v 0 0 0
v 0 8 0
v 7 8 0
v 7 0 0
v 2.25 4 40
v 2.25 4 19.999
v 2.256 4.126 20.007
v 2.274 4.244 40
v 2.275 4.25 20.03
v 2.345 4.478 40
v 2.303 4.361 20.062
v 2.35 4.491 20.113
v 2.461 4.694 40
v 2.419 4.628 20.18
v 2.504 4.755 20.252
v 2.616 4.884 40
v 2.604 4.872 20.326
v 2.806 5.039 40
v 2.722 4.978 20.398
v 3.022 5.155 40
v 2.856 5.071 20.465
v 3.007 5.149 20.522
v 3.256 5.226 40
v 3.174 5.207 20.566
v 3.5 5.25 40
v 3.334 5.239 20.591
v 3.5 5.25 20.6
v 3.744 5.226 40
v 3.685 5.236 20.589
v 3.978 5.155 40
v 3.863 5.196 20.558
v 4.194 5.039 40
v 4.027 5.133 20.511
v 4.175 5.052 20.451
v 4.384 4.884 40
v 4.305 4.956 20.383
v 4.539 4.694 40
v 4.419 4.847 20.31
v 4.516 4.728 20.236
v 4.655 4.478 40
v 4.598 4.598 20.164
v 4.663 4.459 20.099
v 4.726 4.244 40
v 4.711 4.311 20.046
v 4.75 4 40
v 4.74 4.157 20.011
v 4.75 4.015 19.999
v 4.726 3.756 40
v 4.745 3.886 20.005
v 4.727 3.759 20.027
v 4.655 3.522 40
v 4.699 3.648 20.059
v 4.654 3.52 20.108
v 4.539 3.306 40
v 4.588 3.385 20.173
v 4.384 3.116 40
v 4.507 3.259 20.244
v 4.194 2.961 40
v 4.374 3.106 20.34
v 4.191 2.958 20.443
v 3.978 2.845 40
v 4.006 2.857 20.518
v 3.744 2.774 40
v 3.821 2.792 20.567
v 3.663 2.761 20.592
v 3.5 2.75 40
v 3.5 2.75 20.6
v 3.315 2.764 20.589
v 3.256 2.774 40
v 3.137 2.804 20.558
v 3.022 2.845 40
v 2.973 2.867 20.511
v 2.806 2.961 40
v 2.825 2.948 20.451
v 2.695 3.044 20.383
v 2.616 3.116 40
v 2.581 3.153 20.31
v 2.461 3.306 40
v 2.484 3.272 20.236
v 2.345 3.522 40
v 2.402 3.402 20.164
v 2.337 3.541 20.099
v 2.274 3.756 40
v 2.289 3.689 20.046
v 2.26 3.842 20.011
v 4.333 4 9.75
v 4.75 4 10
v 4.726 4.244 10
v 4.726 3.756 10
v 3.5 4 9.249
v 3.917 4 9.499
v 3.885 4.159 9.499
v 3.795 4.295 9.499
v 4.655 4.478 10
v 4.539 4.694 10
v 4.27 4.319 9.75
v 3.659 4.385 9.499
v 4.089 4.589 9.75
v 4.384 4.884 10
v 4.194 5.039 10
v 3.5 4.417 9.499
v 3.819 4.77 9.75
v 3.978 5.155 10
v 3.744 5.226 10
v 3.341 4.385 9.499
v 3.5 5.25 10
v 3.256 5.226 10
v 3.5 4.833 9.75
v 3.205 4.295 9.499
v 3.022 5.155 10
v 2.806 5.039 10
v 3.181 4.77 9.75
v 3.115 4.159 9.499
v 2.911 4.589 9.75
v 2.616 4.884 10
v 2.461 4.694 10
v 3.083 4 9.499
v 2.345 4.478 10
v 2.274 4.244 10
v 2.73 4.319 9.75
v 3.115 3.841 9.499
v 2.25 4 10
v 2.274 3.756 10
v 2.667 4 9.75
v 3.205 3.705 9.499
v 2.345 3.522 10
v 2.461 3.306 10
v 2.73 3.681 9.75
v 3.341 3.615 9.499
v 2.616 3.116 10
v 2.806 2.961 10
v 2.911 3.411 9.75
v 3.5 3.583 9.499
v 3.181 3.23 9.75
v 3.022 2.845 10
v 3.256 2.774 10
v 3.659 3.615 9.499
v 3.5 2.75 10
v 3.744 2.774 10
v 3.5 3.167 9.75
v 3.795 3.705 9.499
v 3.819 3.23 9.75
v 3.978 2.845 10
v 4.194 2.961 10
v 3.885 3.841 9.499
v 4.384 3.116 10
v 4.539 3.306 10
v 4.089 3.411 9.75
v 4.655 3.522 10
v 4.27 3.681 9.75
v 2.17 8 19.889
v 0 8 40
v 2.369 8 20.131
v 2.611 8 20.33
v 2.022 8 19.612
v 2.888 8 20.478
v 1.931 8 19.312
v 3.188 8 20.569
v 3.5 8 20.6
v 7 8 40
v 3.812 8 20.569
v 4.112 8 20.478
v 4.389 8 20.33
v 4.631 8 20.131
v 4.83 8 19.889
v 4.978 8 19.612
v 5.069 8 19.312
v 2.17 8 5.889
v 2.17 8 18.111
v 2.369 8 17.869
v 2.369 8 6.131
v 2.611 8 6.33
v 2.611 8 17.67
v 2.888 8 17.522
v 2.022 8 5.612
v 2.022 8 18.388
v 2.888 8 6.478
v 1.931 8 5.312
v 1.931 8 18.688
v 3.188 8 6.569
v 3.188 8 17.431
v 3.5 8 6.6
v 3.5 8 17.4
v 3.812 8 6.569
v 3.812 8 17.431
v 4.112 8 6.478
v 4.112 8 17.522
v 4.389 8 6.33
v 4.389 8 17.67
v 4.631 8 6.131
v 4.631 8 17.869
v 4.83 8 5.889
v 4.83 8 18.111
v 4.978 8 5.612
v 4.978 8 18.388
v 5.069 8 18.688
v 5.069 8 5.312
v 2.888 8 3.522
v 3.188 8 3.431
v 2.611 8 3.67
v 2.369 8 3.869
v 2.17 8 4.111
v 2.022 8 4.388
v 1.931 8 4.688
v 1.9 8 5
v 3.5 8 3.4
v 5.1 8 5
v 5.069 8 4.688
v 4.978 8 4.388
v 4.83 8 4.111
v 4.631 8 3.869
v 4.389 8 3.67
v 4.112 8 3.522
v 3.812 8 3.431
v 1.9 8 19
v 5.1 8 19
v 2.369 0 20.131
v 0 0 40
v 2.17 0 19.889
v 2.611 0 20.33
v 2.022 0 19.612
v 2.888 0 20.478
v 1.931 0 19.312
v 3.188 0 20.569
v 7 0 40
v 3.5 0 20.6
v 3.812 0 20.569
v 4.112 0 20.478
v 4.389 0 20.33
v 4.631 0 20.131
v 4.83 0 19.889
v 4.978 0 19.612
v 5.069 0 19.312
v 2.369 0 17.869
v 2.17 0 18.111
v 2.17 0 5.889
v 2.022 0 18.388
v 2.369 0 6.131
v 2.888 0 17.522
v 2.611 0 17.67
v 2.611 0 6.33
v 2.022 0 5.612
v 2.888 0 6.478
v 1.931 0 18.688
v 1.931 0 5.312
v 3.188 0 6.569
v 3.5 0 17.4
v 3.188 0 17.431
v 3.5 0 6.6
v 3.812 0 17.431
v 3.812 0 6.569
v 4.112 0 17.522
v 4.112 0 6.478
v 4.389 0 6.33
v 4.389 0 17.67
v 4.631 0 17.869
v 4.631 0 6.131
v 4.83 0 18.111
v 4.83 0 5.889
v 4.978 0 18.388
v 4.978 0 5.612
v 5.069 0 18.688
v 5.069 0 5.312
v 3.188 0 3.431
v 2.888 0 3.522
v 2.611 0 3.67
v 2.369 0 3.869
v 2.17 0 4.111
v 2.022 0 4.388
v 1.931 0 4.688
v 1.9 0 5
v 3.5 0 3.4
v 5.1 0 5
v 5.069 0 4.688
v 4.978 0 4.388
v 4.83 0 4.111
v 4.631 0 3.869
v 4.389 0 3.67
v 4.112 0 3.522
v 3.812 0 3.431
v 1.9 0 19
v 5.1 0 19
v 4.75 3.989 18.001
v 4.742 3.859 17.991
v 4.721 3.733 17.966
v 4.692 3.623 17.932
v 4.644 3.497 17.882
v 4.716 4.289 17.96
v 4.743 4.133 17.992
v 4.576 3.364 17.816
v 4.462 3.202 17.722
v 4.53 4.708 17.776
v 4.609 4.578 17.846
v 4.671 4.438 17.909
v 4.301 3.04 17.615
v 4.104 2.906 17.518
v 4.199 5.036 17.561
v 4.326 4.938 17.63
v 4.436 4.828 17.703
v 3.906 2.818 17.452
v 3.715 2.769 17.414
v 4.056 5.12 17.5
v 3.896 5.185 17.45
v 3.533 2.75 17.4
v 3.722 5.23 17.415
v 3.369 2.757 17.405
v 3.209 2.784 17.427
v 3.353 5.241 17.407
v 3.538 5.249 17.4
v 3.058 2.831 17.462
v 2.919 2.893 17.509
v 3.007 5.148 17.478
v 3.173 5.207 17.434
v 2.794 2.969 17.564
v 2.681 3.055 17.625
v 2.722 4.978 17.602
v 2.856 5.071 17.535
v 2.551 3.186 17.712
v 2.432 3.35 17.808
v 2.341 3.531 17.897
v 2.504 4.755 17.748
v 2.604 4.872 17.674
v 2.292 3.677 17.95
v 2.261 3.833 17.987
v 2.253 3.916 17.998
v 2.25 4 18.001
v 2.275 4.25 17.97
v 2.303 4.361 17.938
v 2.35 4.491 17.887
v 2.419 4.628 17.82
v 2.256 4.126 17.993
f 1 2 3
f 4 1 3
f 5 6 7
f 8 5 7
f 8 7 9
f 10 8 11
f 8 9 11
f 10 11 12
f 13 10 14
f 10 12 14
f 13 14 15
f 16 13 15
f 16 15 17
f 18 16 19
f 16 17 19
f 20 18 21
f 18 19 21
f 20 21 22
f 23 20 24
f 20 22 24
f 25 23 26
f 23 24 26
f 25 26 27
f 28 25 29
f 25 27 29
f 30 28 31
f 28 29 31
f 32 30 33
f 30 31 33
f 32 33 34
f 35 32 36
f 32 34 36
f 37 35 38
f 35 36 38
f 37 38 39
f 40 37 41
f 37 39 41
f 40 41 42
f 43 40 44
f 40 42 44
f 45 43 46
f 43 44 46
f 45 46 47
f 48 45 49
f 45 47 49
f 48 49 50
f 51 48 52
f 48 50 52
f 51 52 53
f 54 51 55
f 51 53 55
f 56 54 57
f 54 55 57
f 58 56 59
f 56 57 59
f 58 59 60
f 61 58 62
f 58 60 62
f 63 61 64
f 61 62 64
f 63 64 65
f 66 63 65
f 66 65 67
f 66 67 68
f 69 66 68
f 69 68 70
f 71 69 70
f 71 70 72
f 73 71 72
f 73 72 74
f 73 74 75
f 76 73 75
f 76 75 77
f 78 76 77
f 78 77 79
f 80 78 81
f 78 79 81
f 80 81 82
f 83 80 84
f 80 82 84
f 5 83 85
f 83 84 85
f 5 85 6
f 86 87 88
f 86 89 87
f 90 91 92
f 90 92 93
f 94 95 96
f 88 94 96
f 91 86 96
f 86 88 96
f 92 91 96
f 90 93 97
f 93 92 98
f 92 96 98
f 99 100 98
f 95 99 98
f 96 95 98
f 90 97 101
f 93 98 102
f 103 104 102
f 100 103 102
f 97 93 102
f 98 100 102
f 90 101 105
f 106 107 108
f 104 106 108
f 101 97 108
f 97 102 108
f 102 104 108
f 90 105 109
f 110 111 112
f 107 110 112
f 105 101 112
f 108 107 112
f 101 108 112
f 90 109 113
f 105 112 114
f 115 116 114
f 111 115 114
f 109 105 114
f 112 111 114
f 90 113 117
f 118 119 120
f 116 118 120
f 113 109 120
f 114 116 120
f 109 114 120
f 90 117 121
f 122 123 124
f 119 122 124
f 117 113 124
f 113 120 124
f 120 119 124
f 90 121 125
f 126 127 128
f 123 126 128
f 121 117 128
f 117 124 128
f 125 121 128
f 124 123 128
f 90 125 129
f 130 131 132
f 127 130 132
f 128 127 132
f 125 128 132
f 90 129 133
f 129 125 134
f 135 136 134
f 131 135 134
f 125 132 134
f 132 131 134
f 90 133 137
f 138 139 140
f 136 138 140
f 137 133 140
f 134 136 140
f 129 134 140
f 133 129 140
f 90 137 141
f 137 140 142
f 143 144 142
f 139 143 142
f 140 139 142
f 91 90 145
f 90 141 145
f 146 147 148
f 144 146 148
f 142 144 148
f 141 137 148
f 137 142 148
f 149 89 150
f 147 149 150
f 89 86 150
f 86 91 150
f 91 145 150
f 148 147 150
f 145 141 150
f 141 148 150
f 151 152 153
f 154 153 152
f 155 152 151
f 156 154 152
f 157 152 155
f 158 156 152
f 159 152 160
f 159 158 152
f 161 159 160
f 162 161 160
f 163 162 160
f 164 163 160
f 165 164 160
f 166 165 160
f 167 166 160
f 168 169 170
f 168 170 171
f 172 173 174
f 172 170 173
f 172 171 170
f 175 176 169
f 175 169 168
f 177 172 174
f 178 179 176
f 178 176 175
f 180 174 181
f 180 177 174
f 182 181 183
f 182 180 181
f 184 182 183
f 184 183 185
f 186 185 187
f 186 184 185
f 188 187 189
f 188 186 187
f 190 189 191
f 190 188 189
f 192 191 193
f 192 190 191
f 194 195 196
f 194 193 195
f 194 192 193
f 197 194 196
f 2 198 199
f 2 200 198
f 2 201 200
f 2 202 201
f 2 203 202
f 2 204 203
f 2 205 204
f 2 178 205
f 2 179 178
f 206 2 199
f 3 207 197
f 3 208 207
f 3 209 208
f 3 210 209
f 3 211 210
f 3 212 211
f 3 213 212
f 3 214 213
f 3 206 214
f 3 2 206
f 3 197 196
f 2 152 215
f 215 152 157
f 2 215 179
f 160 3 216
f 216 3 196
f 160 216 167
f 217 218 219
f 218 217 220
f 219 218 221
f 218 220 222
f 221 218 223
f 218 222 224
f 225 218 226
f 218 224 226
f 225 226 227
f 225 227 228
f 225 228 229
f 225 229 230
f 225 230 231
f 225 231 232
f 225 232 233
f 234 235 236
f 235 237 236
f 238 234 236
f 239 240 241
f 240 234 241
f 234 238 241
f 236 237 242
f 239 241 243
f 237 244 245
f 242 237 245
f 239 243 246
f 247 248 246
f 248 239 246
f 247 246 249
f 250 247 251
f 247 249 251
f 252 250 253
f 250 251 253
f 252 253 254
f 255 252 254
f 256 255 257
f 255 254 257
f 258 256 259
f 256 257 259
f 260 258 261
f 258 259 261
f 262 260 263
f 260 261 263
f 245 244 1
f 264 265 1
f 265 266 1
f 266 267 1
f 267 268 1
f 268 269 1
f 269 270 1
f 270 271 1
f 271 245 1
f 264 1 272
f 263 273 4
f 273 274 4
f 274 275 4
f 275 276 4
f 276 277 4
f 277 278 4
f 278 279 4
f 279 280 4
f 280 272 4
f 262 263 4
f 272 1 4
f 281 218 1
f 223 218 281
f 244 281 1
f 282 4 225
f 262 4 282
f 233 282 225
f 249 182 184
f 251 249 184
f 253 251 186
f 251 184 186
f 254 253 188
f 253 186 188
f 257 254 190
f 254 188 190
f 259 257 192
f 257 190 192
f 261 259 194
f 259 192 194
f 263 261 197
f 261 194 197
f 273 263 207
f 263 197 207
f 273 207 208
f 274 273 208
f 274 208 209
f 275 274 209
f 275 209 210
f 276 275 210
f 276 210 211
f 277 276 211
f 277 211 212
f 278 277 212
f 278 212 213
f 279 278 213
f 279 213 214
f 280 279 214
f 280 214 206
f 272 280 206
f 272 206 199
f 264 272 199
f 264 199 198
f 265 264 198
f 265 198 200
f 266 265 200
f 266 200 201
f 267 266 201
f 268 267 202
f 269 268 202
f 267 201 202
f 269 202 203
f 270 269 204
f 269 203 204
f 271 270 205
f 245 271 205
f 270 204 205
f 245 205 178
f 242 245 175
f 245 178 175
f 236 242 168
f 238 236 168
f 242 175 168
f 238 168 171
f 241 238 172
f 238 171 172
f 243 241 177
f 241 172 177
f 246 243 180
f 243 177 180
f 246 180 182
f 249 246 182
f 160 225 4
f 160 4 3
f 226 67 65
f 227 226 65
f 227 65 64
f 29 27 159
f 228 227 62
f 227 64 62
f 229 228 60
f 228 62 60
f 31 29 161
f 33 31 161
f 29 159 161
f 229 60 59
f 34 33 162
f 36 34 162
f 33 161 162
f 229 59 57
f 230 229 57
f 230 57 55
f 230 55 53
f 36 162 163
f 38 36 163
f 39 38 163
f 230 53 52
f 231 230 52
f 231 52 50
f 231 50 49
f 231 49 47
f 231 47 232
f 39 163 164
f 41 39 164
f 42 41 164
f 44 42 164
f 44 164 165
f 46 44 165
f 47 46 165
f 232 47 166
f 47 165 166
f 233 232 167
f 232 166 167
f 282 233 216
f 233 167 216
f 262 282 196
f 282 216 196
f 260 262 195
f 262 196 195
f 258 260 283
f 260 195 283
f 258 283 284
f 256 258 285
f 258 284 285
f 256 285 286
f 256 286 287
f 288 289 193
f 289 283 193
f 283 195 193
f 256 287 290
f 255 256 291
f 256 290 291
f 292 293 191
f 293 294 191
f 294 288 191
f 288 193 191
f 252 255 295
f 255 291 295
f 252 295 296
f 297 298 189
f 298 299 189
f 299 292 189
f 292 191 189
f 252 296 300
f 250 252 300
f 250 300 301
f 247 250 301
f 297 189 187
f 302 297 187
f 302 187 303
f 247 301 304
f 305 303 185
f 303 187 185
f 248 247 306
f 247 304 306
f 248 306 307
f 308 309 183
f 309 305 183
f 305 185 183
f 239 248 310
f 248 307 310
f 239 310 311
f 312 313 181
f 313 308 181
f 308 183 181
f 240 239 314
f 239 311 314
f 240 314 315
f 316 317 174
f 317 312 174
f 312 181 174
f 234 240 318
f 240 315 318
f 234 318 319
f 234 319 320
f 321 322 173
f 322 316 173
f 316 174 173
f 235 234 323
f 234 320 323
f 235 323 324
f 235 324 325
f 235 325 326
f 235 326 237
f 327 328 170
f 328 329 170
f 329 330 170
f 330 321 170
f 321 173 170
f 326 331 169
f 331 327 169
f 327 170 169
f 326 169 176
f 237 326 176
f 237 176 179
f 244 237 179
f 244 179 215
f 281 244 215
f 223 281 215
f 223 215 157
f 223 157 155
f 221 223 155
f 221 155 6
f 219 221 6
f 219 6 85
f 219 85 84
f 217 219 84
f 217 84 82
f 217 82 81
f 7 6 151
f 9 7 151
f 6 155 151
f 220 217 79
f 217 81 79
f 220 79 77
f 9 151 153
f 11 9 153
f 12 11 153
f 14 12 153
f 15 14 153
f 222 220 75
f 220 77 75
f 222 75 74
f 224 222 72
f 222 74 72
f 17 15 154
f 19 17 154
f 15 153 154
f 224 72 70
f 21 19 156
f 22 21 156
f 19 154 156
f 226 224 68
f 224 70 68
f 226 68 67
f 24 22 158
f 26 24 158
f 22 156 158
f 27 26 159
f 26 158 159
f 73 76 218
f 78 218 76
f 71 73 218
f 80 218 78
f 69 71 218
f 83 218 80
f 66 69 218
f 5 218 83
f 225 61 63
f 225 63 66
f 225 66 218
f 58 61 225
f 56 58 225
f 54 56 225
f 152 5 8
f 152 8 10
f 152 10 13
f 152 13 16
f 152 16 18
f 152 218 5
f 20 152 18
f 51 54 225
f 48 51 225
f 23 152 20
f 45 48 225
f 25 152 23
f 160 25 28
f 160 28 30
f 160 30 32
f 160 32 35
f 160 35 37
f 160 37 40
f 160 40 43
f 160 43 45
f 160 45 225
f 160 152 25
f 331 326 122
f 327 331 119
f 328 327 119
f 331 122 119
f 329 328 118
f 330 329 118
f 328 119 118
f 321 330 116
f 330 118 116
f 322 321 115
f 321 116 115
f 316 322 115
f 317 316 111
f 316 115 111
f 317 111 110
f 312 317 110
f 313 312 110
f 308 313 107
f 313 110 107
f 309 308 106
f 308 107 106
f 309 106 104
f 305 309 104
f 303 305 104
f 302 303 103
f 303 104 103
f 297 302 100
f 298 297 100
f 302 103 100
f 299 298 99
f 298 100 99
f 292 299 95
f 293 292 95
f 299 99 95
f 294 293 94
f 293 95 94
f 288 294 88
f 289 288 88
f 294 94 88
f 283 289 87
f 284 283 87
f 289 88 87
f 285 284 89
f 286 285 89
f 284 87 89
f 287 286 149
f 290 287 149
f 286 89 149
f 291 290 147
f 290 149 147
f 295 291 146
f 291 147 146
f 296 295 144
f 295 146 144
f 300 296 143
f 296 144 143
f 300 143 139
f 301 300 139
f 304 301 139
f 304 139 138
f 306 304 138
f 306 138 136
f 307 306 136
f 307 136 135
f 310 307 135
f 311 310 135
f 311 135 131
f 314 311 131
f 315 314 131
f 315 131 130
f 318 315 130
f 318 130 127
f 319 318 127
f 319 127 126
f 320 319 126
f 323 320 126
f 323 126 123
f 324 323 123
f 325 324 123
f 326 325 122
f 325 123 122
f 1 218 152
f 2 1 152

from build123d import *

# Parameters (mm, degrees)
ESQUISSE1_W                                   = 7
ESQUISSE1_H                                   = 8
BOSS_EXTRU_1_DEPTH                            = 40
TROU_POUR_TARAUDAGE_POUR_TROU_TARAUD_M3_D     = 2.5
TROU_POUR_TARAUDAGE_POUR_TROU_TARAUD_M3_DEPTH = 30
TROU_POUR_TARAUDAGE_POUR_TROU_TARAUD_M3_TIP   = 0.751075774
ESQUISSE4_R                                   = 1.6
ENL_V_MAT_EXTRU_1_DEPTH                       = 42.388404173


with BuildPart() as part:
    # Esquisse1 → Boss.-Extru.1 (new body)
    with BuildSketch(Plane.XY):
        with Locations((3.5, 4)):
            Rectangle(ESQUISSE1_W, ESQUISSE1_H)
    extrude(amount=BOSS_EXTRU_1_DEPTH)

    # Trou pour taraudage pour trou taraudé M31
    with Locations(Plane.XY.offset(40)):
        with Locations((3.5, 4)):
            Hole(TROU_POUR_TARAUDAGE_POUR_TROU_TARAUD_M3_D / 2, depth=TROU_POUR_TARAUDAGE_POUR_TROU_TARAUD_M3_DEPTH)
            with Locations((0, 0, -(TROU_POUR_TARAUDAGE_POUR_TROU_TARAUD_M3_DEPTH + TROU_POUR_TARAUDAGE_POUR_TROU_TARAUD_M3_TIP / 2))):  # 118° drill point
                Cone(0, TROU_POUR_TARAUDAGE_POUR_TROU_TARAUD_M3_D / 2, TROU_POUR_TARAUDAGE_POUR_TROU_TARAUD_M3_TIP, mode=Mode.SUBTRACT)

    # Esquisse4 → Enlèv. mat.-Extru.1 (cut, through all)
    with BuildSketch(Plane(origin=(0, 8, 0), x_dir=(1, 0, 0), z_dir=(0, 1, 0))):
        with Locations(Location((3.5, -5, 0), (0, 0, 270))):
            Circle(ESQUISSE4_R)
        with Locations(Location((3.5, -19, 0), (0, 0, 270))):
            Circle(ESQUISSE4_R)
    extrude(amount=-ENL_V_MAT_EXTRU_1_DEPTH, mode=Mode.SUBTRACT)


solid = part.part
